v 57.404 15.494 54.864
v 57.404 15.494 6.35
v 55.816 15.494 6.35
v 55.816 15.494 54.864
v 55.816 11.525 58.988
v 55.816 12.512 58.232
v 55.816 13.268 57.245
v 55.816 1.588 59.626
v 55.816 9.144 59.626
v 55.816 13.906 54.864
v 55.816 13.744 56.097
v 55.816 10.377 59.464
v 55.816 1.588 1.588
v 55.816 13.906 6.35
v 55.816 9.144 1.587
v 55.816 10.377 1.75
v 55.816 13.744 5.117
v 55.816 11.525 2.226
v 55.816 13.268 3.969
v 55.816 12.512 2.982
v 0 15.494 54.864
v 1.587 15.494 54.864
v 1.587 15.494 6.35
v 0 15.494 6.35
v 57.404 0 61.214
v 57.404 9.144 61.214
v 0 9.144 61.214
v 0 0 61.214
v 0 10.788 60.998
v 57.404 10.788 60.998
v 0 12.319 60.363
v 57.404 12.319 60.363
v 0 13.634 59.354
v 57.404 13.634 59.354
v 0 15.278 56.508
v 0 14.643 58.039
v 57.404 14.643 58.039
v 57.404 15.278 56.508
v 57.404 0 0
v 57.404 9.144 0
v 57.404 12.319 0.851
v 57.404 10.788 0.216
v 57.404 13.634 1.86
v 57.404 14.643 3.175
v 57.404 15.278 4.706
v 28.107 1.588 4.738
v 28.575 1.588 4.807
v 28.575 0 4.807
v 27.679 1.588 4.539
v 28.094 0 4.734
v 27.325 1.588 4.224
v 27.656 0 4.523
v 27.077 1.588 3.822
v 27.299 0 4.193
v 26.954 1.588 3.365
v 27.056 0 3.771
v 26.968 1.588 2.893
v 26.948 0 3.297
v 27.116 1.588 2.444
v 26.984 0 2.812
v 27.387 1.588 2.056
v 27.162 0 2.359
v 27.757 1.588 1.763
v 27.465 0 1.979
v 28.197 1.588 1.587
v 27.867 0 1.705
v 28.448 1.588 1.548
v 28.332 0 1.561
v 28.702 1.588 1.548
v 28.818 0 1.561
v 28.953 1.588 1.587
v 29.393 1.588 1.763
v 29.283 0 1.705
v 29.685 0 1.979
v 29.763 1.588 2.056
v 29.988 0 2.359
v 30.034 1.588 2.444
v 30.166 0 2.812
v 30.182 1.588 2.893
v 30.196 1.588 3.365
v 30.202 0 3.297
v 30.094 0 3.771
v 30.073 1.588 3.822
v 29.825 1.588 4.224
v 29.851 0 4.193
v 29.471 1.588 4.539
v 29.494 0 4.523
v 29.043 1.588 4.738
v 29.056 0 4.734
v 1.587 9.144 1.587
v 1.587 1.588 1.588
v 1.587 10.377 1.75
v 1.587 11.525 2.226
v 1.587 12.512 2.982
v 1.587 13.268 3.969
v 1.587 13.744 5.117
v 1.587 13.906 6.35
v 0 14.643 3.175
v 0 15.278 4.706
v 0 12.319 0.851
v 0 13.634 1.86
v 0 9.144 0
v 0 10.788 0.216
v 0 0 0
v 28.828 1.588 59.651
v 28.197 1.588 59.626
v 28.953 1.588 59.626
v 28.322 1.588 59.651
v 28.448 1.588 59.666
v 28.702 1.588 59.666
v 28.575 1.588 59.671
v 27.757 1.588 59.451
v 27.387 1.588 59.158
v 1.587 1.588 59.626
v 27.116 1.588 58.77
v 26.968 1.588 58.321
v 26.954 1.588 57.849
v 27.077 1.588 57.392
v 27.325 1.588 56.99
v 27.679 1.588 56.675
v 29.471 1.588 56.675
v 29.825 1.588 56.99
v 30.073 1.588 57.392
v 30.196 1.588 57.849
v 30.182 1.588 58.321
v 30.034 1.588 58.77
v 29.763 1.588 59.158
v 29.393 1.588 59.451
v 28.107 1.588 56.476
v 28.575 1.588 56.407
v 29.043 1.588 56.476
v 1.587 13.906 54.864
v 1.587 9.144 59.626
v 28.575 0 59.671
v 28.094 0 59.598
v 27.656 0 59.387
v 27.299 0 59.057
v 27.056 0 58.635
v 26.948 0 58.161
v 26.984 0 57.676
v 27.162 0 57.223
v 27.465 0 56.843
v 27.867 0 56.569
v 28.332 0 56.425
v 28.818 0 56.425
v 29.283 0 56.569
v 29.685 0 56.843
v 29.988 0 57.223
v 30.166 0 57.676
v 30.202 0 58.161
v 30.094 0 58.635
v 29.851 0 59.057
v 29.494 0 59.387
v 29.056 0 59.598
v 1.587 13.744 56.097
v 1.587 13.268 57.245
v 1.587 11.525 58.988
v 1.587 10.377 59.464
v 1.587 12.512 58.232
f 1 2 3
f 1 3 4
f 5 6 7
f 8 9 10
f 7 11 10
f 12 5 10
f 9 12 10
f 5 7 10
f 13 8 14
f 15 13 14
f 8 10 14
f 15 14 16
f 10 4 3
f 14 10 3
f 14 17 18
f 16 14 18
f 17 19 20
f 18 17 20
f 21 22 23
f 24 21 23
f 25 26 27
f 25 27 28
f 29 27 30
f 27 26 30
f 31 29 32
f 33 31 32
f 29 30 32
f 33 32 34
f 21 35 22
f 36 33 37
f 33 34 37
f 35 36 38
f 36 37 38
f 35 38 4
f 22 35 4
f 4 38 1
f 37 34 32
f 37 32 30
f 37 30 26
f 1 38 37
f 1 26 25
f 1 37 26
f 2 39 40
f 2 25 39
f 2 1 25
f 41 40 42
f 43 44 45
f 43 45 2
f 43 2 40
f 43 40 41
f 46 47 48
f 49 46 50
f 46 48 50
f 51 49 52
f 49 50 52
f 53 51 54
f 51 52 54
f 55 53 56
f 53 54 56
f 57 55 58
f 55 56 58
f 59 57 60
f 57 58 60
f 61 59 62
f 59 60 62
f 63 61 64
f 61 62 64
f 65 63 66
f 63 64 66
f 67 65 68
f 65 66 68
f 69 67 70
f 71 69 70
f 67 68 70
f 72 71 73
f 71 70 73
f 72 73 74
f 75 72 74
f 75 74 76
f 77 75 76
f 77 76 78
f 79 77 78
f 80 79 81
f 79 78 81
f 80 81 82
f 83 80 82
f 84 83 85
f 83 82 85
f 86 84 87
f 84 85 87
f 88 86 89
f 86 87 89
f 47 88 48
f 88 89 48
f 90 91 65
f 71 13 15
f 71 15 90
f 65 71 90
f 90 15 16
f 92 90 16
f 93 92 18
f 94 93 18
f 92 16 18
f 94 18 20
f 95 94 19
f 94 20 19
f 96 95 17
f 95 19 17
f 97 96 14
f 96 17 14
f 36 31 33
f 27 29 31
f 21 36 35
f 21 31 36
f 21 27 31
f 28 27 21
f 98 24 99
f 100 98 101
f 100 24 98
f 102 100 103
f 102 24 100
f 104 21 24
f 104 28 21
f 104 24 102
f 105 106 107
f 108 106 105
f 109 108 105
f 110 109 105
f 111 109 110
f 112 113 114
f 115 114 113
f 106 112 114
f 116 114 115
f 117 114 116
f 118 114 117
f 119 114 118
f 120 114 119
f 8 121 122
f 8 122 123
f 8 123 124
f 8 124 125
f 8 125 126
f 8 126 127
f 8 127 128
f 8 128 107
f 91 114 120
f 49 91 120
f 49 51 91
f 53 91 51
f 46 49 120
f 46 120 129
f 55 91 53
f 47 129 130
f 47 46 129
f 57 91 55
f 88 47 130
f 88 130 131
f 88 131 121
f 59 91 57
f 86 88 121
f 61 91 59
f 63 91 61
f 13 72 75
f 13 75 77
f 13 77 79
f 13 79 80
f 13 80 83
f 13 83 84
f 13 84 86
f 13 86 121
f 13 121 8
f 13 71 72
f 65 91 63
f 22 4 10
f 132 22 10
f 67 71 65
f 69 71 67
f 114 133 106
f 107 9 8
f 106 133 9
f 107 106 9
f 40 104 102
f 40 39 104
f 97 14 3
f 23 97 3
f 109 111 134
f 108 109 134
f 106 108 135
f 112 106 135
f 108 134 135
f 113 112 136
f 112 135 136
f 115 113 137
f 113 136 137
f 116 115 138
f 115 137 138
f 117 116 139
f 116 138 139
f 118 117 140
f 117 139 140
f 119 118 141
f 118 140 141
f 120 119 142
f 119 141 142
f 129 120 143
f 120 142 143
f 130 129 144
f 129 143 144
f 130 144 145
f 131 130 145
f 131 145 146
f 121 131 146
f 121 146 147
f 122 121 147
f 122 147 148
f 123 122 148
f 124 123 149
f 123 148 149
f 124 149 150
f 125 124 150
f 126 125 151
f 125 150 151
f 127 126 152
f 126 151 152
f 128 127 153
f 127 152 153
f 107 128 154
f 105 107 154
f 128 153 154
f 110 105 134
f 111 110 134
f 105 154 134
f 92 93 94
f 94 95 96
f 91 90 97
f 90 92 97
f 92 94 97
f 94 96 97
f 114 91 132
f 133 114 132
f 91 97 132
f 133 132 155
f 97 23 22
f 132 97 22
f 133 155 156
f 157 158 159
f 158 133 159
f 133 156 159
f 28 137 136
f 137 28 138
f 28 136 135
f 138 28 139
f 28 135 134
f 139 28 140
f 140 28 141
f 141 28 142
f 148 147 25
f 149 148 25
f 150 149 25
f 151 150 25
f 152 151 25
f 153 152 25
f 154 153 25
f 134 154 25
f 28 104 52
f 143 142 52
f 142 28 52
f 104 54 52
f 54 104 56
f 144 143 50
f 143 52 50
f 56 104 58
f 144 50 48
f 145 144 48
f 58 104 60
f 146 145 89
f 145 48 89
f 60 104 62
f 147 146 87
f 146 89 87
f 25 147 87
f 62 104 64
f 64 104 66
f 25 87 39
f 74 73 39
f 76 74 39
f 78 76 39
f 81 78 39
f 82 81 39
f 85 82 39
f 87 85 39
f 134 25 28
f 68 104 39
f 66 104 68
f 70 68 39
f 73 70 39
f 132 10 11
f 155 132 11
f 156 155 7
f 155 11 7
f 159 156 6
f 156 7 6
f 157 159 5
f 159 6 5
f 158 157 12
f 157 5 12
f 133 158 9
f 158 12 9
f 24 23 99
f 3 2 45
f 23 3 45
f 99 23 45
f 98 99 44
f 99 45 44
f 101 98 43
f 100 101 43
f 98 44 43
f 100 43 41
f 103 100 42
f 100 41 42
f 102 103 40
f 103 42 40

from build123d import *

# Parameters (mm, degrees)
SKETCH1_W                      = 57.404
SKETCH1_H                      = 61.214
BOSS_EXTRUDE1_DEPTH            = 1.5875
BOSS_EXTRUDE2_DEPTH            = 1.5875
BOSS_EXTRUDE3_DEPTH            = 54.229
BOSS_EXTRUDE4_DEPTH            = 1.5875
SKETCH6_W                      = 1.63195
SKETCH6_H                      = 1.5875
F_4_CLEARANCE_HOLE1_AT_2_COUNT = 2
F_4_CLEARANCE_HOLE1_AT_2_PITCH = 54.864


with BuildPart() as part:
    # Sketch1 → Boss-Extrude1 (new body)
    with BuildSketch(Plane(origin=(0, 0, 0), x_dir=(1, 0, 0), z_dir=(0, 1, 0))):
        with Locations((28.702, -30.607)):
            Rectangle(SKETCH1_W, SKETCH1_H)
    extrude(amount=BOSS_EXTRUDE1_DEPTH)

    # Sketch2 → Boss-Extrude2 (add)
    with BuildSketch(Plane(origin=(57.404, 0, 0), x_dir=(0, 0, -1), z_dir=(1, 0, 0))):
        with BuildLine():
            Line((-61.214, 1.5875), (0, 1.5875))
            Line((0, 1.5875), (0, 9.144))
            ThreePointArc((0, 9.144), (-1.859871939, 13.634128061), (-6.35, 15.494))
            Line((-6.35, 15.494), (-54.864, 15.494))
            ThreePointArc((-54.864, 15.494), (-59.354128061, 13.634128061), (-61.214, 9.144))
            Line((-61.214, 9.144), (-61.214, 1.5875))
        make_face()
    extrude(amount=-BOSS_EXTRUDE2_DEPTH)

    # Sketch3 → Boss-Extrude3 (add)
    with BuildSketch(Plane.ZY.offset(-55.8165)):
        with BuildLine():
            Line((1.5875, 1.5875), (1.5875, 3.175))
            Line((1.5875, 3.175), (1.5875, 9.144))
            ThreePointArc((1.5875, 9.144), (2.982403955, 12.511596045), (6.35, 13.9065))
            Line((6.35, 13.9065), (6.35, 15.494))
            ThreePointArc((6.35, 15.494), (1.859871939, 13.634128061), (0, 9.144))
            Line((0, 9.144), (0, 1.5875))
            Line((0, 1.5875), (1.5875, 1.5875))
        make_face()
        with BuildLine():
            Line((59.6265, 9.144), (59.6265, 3.175))
            Line((59.6265, 3.175), (59.6265, 1.5875))
            Line((59.6265, 1.5875), (61.214, 1.5875))
            Line((61.214, 1.5875), (61.214, 9.144))
            ThreePointArc((61.214, 9.144), (59.354128061, 13.634128061), (54.864, 15.494))
            Line((54.864, 15.494), (54.864, 13.9065))
            ThreePointArc((54.864, 13.9065), (58.231596045, 12.511596045), (59.6265, 9.144))
        make_face()
    extrude(amount=BOSS_EXTRUDE3_DEPTH)

    # Sketch4 → Boss-Extrude4 (add)
    with BuildSketch(Plane.ZY.offset(-1.5875)):
        with BuildLine():
            Line((0, 0), (61.214, 0))
            Line((61.214, 0), (61.214, 9.144))
            ThreePointArc((61.214, 9.144), (59.354128061, 13.634128061), (54.864, 15.494))
            Line((54.864, 15.494), (6.35, 15.494))
            ThreePointArc((6.35, 15.494), (1.859871939, 13.634128061), (0, 9.144))
            Line((0, 9.144), (0, 0))
        make_face()
    extrude(amount=BOSS_EXTRUDE4_DEPTH)

    # Sketch6 → #4 Clearance Hole1 (revolve, cut)
    with BuildSketch(Plane(origin=(28.575, 1.5875, 58.039), x_dir=(0, 0, 1), z_dir=(1, 0, 0))):
        with Locations((0.815975, 0.79375)):
            Rectangle(SKETCH6_W, SKETCH6_H)
    f_4_clearance_hole1 = revolve(axis=Axis((28.575, 7.9375, 58.039), (0, -1, 0)), mode=Mode.SUBTRACT)

    # #4 Clearance Hole1 at 2: #4 Clearance Hole1 ×2
    with Locations(*[(0, 0, -i * F_4_CLEARANCE_HOLE1_AT_2_PITCH) for i in range(1, F_4_CLEARANCE_HOLE1_AT_2_COUNT)]):
        add(f_4_clearance_hole1, mode=Mode.SUBTRACT)


solid = part.part
